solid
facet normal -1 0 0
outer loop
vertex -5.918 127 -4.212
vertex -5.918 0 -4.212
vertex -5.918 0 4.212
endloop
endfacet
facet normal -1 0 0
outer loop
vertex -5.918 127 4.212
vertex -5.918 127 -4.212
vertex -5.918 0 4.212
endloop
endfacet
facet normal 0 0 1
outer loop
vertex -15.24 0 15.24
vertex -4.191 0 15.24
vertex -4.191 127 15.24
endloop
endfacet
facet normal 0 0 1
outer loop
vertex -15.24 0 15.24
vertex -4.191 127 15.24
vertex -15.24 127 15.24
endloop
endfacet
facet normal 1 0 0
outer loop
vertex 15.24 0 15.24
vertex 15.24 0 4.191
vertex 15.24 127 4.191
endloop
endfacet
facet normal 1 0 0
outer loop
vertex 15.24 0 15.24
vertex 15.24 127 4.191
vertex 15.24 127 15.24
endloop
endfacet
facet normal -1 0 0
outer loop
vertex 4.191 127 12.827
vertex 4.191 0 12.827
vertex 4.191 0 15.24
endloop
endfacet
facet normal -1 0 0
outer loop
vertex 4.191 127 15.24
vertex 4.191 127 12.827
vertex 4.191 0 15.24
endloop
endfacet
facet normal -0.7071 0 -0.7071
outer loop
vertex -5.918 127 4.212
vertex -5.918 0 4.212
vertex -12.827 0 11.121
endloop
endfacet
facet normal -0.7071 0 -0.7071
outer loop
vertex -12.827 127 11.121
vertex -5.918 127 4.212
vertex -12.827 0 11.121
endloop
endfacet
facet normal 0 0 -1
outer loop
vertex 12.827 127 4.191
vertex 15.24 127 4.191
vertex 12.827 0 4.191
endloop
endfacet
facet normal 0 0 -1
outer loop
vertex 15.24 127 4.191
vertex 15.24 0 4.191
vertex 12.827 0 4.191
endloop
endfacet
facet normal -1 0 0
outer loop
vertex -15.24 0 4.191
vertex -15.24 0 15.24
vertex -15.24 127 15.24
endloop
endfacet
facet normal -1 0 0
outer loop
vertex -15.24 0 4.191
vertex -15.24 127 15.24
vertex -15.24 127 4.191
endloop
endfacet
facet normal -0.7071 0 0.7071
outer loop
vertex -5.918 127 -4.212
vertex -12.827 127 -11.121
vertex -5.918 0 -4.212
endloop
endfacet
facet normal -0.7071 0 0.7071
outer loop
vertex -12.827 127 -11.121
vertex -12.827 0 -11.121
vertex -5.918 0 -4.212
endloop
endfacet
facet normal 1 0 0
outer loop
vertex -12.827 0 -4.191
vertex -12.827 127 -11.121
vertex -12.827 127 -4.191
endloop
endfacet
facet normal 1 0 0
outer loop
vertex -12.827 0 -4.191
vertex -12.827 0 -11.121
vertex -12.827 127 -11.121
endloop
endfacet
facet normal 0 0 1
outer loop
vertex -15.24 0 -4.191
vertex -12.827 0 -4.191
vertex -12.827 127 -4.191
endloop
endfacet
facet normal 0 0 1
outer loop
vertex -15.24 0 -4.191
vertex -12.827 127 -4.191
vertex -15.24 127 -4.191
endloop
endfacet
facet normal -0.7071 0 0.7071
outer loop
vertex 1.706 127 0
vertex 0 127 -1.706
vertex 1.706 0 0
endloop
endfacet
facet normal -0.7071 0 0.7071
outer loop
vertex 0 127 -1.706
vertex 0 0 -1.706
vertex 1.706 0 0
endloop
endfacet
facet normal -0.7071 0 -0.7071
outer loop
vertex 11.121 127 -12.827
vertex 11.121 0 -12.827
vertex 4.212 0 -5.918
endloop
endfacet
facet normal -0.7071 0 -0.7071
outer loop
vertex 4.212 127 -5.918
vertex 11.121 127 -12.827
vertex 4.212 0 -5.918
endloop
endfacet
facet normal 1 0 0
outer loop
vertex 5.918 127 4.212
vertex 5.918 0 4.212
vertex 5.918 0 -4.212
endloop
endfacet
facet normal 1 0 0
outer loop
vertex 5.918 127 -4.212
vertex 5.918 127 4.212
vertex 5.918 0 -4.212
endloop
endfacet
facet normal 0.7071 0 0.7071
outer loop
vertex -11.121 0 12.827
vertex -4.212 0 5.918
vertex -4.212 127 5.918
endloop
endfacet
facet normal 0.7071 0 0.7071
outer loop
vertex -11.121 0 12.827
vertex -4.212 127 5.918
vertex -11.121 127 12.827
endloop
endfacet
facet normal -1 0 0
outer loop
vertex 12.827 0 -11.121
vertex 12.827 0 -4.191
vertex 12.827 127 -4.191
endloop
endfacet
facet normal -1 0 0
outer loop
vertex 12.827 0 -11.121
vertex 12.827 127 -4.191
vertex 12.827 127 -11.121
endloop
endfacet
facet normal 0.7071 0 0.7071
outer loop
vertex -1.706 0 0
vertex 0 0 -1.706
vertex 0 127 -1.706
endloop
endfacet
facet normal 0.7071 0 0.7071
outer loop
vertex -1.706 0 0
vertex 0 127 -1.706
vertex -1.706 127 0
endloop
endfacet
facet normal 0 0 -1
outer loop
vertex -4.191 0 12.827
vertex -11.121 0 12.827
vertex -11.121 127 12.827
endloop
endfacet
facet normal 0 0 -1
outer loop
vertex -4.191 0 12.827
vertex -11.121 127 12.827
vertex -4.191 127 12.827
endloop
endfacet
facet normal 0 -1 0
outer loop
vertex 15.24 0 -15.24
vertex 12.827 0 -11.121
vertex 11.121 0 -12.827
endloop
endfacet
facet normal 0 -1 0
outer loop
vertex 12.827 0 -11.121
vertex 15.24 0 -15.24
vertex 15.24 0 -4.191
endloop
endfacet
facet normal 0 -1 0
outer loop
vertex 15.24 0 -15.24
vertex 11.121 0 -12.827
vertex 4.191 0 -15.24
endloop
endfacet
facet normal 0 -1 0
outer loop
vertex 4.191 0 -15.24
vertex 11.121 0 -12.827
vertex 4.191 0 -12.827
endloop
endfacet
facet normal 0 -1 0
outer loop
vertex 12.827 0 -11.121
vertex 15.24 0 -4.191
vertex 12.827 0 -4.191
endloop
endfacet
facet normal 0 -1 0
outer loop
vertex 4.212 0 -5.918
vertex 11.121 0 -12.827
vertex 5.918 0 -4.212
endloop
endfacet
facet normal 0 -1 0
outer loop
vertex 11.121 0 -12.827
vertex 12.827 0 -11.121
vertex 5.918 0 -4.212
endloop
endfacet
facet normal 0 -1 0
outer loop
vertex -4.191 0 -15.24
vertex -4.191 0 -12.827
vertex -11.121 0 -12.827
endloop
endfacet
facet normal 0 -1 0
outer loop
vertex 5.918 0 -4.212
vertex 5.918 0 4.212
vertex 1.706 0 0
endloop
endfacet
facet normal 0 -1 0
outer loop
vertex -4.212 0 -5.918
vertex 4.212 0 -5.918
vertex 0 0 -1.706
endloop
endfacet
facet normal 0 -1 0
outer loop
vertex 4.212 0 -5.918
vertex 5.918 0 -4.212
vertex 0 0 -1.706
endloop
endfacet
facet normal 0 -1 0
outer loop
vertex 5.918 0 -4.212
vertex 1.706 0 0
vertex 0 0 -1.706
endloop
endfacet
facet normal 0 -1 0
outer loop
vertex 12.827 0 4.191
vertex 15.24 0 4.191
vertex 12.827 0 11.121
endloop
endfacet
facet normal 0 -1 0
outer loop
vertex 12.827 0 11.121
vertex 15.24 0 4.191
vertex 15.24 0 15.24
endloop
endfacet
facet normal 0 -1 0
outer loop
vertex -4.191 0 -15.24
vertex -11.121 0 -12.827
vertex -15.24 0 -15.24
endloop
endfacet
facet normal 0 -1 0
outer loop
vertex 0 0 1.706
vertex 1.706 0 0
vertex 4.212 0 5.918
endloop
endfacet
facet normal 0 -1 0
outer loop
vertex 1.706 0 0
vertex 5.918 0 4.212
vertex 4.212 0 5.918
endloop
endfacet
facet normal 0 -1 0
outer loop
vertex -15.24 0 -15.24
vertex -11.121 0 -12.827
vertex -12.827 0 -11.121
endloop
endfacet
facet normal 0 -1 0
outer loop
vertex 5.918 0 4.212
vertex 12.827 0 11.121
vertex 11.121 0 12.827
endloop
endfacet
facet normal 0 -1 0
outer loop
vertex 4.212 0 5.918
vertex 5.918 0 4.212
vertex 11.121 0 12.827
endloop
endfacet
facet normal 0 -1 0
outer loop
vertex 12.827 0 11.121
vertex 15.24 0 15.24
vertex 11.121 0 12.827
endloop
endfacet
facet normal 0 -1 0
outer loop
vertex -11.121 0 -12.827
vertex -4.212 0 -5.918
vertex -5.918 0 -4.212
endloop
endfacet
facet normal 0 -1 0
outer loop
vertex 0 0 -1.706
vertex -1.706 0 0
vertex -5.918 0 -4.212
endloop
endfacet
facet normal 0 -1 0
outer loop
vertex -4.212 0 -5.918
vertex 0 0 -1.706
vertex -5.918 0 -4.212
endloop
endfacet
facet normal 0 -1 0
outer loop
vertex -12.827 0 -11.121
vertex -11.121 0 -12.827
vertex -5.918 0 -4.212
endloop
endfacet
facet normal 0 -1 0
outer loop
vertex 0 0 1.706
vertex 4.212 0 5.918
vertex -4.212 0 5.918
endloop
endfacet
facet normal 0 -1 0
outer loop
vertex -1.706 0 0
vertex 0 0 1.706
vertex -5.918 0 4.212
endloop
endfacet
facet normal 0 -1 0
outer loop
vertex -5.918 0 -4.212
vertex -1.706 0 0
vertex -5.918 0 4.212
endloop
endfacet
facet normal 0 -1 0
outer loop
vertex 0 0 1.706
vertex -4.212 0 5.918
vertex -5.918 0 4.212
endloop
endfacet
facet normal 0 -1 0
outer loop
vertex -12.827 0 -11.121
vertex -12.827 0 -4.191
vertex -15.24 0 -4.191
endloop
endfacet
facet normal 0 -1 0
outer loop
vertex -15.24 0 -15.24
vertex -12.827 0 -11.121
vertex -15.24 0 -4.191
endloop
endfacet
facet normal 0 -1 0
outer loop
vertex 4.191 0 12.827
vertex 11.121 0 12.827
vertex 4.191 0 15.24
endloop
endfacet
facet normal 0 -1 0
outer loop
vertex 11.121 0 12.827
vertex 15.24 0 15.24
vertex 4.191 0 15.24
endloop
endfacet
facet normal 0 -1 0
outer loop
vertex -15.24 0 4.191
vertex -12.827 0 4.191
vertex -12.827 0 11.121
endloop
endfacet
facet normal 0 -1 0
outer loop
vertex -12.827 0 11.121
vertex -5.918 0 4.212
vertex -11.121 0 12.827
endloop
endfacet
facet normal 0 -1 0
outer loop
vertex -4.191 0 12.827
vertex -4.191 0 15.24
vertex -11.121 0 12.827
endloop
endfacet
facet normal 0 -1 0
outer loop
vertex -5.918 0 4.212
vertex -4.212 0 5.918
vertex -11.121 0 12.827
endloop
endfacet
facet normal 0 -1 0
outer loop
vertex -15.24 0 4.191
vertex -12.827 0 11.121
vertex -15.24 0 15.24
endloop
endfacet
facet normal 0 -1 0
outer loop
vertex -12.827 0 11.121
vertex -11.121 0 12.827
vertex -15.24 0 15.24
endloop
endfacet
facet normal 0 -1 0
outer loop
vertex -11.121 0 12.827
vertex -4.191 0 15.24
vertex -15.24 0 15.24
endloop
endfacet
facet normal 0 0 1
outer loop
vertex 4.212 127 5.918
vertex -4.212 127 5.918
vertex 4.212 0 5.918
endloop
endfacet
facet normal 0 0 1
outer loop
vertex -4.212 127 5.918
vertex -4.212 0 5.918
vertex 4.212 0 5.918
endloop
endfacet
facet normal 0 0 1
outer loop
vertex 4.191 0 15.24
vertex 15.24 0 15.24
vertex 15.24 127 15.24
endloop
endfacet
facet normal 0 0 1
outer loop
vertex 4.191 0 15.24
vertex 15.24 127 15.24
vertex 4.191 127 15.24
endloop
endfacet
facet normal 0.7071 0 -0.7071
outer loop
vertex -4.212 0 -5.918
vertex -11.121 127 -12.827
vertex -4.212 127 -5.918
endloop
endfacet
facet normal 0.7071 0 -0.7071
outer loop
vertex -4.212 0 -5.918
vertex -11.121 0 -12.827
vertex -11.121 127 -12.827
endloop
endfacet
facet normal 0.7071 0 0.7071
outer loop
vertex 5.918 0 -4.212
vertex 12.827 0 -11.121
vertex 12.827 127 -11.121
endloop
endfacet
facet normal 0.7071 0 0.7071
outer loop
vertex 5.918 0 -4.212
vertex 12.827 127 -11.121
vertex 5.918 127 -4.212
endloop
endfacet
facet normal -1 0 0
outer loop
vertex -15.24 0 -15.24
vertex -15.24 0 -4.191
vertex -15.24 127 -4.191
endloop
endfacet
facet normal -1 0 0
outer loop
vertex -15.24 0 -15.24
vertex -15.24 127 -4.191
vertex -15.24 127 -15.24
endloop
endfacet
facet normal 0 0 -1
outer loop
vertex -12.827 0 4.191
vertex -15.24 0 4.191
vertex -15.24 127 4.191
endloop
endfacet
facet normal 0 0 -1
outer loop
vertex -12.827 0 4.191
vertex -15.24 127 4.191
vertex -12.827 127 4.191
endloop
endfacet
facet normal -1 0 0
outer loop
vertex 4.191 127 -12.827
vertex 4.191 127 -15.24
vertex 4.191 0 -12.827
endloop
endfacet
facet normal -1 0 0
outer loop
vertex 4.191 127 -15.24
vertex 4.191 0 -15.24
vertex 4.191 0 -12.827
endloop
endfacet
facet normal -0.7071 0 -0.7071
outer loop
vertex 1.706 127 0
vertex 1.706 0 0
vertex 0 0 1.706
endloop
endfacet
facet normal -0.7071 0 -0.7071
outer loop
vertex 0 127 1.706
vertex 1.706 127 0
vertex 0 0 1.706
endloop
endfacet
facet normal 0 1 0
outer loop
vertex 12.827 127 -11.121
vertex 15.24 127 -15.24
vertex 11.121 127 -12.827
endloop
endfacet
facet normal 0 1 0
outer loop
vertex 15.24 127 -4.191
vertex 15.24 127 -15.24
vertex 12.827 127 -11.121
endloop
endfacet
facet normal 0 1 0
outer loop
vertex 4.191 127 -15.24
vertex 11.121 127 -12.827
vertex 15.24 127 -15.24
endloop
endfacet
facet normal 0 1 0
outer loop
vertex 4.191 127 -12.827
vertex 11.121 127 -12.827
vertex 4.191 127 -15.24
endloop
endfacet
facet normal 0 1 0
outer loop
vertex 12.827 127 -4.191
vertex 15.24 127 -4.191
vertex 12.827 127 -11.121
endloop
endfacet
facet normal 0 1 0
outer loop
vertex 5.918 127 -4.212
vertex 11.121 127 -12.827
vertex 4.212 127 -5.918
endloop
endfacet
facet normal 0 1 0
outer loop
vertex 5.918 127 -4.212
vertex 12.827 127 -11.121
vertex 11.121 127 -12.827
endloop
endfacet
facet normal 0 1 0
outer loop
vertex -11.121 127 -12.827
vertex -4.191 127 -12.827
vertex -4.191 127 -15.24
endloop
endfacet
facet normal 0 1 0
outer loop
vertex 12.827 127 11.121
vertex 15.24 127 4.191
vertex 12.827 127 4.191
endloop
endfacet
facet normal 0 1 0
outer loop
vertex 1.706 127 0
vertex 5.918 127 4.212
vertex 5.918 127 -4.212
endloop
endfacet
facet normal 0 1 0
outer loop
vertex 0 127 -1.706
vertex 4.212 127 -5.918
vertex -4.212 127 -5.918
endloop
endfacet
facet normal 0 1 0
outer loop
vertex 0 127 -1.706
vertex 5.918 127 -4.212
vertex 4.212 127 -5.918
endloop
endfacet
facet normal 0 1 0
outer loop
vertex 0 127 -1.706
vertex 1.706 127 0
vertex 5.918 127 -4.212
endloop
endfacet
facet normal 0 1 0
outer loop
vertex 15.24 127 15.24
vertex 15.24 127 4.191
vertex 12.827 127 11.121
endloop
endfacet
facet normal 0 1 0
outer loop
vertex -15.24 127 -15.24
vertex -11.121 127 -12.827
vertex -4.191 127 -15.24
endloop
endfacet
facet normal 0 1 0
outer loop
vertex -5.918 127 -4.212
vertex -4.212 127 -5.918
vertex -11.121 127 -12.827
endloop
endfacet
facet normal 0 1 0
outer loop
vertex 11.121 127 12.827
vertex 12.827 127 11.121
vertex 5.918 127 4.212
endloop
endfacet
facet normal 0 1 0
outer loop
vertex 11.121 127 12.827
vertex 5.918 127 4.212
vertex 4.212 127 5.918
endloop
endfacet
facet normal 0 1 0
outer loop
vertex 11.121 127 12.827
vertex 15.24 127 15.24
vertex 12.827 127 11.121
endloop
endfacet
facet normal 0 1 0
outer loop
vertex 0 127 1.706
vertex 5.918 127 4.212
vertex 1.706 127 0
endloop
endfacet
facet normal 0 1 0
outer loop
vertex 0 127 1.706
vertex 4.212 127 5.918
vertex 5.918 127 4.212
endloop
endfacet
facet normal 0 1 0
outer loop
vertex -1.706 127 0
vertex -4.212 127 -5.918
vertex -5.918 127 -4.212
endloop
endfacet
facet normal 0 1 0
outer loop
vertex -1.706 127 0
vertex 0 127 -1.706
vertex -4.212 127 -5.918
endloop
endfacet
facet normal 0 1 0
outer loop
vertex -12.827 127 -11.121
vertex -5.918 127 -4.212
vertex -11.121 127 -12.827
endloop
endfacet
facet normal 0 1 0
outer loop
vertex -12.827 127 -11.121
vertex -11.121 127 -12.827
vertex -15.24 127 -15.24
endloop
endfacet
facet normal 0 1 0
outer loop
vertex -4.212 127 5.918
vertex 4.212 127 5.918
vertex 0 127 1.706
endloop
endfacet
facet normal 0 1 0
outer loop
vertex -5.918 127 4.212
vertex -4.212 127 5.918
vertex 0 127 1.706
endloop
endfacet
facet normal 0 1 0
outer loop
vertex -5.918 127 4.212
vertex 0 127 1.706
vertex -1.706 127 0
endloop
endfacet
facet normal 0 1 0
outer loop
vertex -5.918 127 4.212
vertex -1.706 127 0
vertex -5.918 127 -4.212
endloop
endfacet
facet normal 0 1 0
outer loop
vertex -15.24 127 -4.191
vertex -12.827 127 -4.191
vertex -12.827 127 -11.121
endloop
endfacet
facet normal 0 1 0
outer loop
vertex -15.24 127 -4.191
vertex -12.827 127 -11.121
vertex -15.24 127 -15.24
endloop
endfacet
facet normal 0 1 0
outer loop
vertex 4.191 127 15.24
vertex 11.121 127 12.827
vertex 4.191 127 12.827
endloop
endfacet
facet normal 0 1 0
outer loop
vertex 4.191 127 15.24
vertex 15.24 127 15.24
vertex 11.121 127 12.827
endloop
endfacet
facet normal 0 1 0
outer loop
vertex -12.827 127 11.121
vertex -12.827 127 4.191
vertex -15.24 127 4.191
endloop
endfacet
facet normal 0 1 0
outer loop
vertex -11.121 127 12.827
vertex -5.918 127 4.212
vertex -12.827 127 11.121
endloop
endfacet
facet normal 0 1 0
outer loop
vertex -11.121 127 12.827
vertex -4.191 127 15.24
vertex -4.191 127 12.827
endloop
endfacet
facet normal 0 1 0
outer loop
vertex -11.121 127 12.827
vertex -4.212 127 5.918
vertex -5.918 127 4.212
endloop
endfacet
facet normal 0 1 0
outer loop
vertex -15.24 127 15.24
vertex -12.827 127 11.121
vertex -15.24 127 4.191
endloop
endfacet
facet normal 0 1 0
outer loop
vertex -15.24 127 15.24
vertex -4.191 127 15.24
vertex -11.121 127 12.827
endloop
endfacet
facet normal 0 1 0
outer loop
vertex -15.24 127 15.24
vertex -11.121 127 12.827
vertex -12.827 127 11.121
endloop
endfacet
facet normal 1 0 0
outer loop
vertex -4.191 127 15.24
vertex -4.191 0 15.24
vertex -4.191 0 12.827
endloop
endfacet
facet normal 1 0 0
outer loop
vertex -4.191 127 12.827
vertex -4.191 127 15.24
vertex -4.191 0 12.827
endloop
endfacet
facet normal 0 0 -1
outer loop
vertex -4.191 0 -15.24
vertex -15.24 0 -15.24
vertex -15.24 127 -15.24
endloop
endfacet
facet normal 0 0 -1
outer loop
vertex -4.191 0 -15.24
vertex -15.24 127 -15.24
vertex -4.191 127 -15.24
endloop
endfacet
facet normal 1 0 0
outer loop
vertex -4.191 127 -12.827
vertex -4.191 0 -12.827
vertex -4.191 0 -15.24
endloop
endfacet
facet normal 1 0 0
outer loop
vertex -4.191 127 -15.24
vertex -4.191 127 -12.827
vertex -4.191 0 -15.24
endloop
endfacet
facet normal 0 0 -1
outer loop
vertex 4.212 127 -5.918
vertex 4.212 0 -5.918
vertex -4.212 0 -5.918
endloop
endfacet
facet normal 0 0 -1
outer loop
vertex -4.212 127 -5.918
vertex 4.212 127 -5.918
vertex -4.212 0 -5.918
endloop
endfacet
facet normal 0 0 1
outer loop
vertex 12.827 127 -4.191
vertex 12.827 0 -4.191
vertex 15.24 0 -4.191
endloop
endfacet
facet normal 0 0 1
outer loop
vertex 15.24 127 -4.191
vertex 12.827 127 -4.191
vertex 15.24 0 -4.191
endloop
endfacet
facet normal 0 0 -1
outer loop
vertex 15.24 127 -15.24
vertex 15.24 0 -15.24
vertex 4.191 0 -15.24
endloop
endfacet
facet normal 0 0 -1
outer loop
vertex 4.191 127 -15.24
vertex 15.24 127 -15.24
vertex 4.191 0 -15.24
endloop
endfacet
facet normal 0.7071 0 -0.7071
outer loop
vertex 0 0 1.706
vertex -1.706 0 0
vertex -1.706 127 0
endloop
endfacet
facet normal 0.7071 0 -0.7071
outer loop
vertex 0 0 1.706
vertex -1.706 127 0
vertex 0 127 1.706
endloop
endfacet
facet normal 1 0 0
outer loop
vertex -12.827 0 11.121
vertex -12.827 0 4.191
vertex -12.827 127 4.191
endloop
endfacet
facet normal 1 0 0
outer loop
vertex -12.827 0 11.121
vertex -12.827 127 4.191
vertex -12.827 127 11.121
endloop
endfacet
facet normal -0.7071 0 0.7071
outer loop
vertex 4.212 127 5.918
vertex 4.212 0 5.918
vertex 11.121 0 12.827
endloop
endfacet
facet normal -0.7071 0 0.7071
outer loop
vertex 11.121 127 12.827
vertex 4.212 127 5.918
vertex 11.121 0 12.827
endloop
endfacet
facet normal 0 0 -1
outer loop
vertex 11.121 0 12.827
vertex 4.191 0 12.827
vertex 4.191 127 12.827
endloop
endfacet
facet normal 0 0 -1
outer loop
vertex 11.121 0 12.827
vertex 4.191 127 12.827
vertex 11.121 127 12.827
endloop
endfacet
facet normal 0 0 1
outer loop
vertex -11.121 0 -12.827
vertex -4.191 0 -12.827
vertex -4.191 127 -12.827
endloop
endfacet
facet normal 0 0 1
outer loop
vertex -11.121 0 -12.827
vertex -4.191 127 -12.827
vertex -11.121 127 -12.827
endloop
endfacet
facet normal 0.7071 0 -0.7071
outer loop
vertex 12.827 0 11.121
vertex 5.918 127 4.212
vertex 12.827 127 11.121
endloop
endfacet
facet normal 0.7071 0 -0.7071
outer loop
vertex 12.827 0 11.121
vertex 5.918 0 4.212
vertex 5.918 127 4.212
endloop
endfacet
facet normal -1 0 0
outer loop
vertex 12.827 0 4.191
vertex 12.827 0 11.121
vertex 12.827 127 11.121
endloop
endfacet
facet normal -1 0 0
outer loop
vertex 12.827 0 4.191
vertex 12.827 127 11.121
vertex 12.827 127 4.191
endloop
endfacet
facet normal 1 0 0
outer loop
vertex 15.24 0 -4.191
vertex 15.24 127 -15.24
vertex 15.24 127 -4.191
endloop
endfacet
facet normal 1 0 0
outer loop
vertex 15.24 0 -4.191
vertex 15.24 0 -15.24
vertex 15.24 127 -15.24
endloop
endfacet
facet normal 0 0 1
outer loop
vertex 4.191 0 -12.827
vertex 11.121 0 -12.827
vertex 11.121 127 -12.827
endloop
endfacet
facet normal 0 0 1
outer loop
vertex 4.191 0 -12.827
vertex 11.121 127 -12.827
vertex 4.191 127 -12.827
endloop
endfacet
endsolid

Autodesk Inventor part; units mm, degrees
ref_plane "YZ Plane" through (0, 0, 0) normal (1, 0, 0) x (0, 1, 0)
ref_plane "XZ Plane" through (0, 0, 0) normal (0, 1, 0) x (-1, 0, 0)
ref_plane "XY Plane" through (0, 0, 0) normal (0, 0, 1) x (1, 0, 0)
sketch "Sketch1" plane through (0, 0, 0) normal (0, 1, 0) x (-1, 0, 0)
  line L0 (0, -29.8704) -> (0, 29.8704) projected
  line L1 (-29.8704, 0) -> (29.8704, 0) projected
  line L2 (0, -21.336) -> (0, 21.336)
  line L3 (-21.336, 0) -> (21.336, 0)
  line L4 (15.24, -15.24) -> (4.191, -15.24)
  line L5 (-15.24, -15.24) -> (-4.191, -15.24)
  line L6 (15.24, 4.191) -> (12.827, 4.191)
  line L7 (12.827, -4.191) -> (15.24, -4.191)
  line L8 (-4.191, 12.827) -> (-4.191, 15.24)
  line L9 (4.191, 15.24) -> (4.191, 12.827)
  line L10 (-11.1208, -12.827) -> (-4.212, -5.9182)
  line L11 (-12.827, -11.1208) -> (-5.9182, -4.212)
  line L12 (-5.9182, 4.212) -> (-12.827, 11.1208)
  line L13 (-4.212, 5.9182) -> (-11.1208, 12.827)
  line L14 (-1.7062, 0) -> (0, 1.7062)
  line L15 (4.212, 5.9182) -> (11.1208, 12.827)
  line L16 (0, -1.7062) -> (1.7062, 0)
  line L17 (5.9182, 4.212) -> (12.827, 11.1208)
  line L18 (12.827, -11.1208) -> (5.9182, -4.212)
  line L19 (1.7062, 0) -> (0, 1.7062)
  line L20 (11.1208, -12.827) -> (4.212, -5.9182)
  line L21 (0, -1.7062) -> (-1.7062, 0)
  line L22 (4.191, -12.827) -> (4.191, -15.24)
  line L23 (-15.24, 4.191) -> (-12.827, 4.191)
  line L24 (-4.191, -15.24) -> (-4.191, -12.827)
  line L25 (-12.827, -4.191) -> (-15.24, -4.191)
  line L26 (11.1208, 12.827) -> (4.191, 12.827)
  line L27 (-4.191, 12.827) -> (-11.1208, 12.827)
  line L28 (-12.827, 11.1208) -> (-12.827, 4.191)
  line L29 (-12.827, -4.191) -> (-12.827, -11.1208)
  line L30 (-11.1208, -12.827) -> (-4.191, -12.827)
  line L31 (4.191, -12.827) -> (11.1208, -12.827)
  line L32 (12.827, -11.1208) -> (12.827, -4.191)
  line L33 (12.827, 4.191) -> (12.827, 11.1208)
  line L34 (-15.24, -15.24) -> (-15.24, -4.191)
  line L35 (-15.24, 4.191) -> (-15.24, 15.24)
  line L36 (15.24, -15.24) -> (4.191, -15.24)
  line L37 (-4.191, -15.24) -> (-15.24, -15.24)
  line L38 (15.24, 15.24) -> (15.24, 4.191)
  line L39 (15.24, -4.191) -> (15.24, -15.24)
  line L40 (-15.24, 15.24) -> (-4.191, 15.24)
  line L41 (4.191, 15.24) -> (15.24, 15.24)
  line L42 (4.212, 5.9182) -> (-4.212, 5.9182)
  line L43 (-5.9182, 4.212) -> (-5.9182, -4.212)
  line L44 (-4.212, -5.9182) -> (4.212, -5.9182)
  line L45 (5.9182, -4.212) -> (5.9182, 4.212)
  line L46 (5.9182, 5.9182) -> (-5.9182, -5.9182) construction
  line L47 (-5.9182, 5.9182) -> (5.9182, -5.9182) construction
  point P0 (0, 0)
  point P1 (0, 0)
  point P2 (0, -4.191)
  point P3 (-4.191, 0)
  point P4 (0, 4.191)
  point P5 (4.191, 0)
  dimension "d0" = 11.049
  dimension "d1" = 30.48
  dimension "d2" = 30.48
  dimension "d3" = 11.8364
  dimension "d4" = 11.8364
extrude "Extrusion1" add sketch "Sketch1" along normal blind 127 contours L44 L10 L30 L24 L5 L34 L25 L29 L11 L43 L1 L21 L0 | L0 L16 L1 L45 L18 L32 L7 L39 L4 L22 L31 L20 L44 | L19 L0 L42 L15 L26 L9 L41 L38 L6 L33 L17 L45 L1 | L1 L43 L12 L28 L23 L35 L40 L8 L27 L13 L42 L0 L14
properties part number "ProfileTwo"
